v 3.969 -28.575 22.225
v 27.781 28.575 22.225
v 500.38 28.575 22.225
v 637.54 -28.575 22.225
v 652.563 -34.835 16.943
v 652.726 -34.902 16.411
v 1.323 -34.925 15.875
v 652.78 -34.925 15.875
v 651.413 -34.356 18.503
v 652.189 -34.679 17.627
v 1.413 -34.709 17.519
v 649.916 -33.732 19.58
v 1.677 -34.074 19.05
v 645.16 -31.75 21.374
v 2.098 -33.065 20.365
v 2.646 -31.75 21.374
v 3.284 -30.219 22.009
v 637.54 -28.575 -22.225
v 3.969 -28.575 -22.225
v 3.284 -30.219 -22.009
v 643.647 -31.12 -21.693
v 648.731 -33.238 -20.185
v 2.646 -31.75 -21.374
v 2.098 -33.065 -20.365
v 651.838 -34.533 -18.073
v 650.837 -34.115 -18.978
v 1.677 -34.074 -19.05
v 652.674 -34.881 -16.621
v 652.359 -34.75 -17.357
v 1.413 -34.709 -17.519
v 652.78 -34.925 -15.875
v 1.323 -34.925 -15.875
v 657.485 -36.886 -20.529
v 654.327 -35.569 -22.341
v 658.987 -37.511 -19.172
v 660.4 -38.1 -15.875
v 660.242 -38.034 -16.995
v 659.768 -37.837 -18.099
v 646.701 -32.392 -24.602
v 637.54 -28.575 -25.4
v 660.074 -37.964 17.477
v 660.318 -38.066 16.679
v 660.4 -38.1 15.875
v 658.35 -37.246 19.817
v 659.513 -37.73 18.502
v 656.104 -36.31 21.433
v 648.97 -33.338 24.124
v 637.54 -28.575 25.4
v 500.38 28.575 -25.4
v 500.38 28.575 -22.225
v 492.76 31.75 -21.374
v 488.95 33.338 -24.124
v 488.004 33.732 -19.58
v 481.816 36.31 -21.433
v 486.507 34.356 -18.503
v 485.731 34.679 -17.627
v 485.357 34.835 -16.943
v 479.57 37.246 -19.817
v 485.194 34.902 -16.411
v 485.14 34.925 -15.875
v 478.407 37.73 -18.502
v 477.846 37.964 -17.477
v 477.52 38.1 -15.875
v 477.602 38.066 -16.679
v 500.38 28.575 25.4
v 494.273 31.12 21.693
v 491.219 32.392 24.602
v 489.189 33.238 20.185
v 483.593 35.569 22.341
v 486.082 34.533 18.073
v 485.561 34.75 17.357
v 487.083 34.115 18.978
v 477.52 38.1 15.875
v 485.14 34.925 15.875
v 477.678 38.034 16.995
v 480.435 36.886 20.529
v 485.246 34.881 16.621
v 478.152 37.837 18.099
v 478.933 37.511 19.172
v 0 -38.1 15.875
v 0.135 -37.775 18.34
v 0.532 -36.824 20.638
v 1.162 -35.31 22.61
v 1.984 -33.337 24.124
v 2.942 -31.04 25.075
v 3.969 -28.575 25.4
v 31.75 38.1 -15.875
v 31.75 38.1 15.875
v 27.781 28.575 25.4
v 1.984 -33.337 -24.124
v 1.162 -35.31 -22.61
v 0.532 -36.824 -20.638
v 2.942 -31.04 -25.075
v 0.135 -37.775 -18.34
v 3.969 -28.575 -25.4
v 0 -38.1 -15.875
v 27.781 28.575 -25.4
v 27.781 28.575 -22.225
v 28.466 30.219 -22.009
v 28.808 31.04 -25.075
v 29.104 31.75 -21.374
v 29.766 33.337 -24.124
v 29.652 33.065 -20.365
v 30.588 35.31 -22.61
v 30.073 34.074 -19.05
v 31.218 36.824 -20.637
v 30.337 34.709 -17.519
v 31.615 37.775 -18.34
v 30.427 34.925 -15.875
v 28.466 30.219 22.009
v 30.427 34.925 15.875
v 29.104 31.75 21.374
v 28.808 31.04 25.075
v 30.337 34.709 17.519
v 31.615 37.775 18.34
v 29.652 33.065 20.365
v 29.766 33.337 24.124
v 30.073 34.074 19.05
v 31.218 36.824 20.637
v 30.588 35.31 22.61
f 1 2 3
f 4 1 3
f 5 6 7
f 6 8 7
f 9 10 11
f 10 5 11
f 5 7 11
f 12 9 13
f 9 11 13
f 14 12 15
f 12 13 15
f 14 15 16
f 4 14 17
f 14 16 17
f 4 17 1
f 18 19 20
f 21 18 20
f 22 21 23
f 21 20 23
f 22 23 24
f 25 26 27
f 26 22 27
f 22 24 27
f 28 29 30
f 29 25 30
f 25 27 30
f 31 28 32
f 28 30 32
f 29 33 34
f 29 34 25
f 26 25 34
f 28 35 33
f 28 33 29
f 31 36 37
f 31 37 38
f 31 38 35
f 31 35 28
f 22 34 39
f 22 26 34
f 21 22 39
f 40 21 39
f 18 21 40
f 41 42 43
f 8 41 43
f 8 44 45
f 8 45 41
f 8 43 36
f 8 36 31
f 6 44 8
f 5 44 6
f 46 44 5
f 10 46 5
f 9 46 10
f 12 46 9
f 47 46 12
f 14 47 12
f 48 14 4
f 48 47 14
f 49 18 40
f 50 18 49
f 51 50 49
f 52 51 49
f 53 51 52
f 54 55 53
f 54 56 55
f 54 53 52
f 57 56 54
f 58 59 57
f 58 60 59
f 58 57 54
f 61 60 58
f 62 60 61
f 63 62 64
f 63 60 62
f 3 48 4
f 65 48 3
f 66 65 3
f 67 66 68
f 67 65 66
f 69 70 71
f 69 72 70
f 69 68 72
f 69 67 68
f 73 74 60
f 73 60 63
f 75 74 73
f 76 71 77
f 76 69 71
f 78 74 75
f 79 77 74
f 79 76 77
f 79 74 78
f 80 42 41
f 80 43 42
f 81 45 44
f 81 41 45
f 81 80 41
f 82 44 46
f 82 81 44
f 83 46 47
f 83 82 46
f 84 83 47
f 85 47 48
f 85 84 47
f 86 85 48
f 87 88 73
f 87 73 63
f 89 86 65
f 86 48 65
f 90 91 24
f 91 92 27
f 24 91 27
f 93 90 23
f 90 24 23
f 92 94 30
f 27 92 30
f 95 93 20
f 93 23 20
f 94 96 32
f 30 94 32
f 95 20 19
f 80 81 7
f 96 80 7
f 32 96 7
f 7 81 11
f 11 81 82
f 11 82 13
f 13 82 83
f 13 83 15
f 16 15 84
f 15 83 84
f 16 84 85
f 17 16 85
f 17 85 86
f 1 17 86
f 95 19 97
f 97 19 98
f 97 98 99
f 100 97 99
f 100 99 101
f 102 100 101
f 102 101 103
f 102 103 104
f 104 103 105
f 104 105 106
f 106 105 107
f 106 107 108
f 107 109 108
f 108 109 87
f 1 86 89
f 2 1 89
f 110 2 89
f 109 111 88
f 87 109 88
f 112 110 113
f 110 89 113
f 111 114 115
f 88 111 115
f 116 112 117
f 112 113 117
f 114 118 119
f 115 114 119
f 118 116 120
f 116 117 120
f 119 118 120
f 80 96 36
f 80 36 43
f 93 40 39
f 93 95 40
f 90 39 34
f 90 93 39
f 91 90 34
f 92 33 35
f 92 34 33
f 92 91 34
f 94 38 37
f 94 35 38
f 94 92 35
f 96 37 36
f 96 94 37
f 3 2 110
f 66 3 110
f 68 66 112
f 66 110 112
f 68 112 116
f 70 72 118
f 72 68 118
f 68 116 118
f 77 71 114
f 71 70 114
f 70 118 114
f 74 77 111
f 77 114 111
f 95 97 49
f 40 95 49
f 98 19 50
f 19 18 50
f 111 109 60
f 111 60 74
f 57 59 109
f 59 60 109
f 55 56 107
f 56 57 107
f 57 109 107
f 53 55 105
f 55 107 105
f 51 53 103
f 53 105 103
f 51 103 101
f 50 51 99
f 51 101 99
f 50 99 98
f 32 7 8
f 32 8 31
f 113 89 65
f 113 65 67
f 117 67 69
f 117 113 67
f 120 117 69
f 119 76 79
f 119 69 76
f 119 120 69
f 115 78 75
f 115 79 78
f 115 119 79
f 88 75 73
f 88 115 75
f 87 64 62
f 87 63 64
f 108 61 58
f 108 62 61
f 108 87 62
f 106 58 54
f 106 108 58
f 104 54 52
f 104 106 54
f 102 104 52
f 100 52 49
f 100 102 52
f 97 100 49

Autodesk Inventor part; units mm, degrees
ref_plane "YZ Plane" through (0, 0, 0) normal (1, 0, 0) x (0, 1, 0)
ref_plane "XZ Plane" through (0, 0, 0) normal (0, 1, 0) x (-1, 0, 0)
ref_plane "XY Plane" through (0, 0, 0) normal (0, 0, 1) x (1, 0, 0)
sketch "Sketch1" plane through (0, 0, 0) normal (1, 0, 0) x (0, 1, 0)
  line L0 (-28.575, 25.4) -> (28.575, 25.4)
  line L1 (38.1, 15.875) -> (38.1, -15.875)
  line L2 (28.575, -25.4) -> (-28.575, -25.4)
  line L3 (-38.1, -15.875) -> (-38.1, 15.875)
  line L4 (-38.1, 25.4) -> (38.1, -25.4) construction
  line L5 (38.1, 25.4) -> (-38.1, -25.4) construction
  arc A0 (38.1, 15.875) -> (28.575, 25.4) centre (28.575, 15.875) ccw
  arc A1 (-28.575, 25.4) -> (-38.1, 15.875) centre (-28.575, 15.875) ccw
  arc A2 (-38.1, -15.875) -> (-28.575, -25.4) centre (-28.575, -15.875) ccw
  arc A3 (28.575, -25.4) -> (38.1, -15.875) centre (28.575, -15.875) ccw
  line L6 (34.925, -15.875) -> (34.925, 15.875)
  arc A4 (34.925, 15.875) -> (28.575, 22.225) centre (28.575, 15.875) ccw
  line L7 (28.575, 22.225) -> (-28.575, 22.225)
  arc A5 (-28.575, 22.225) -> (-34.925, 15.875) centre (-28.575, 15.875) ccw
  line L8 (-34.925, 15.875) -> (-34.925, -15.875)
  arc A6 (-34.925, -15.875) -> (-28.575, -22.225) centre (-28.575, -15.875) ccw
  line L9 (-28.575, -22.225) -> (28.575, -22.225)
  arc A7 (28.575, -22.225) -> (34.925, -15.875) centre (28.575, -15.875) ccw
  point P0 (0, 0)
  dimension "d0" = 76.2
  dimension "d1" = 50.8
  dimension "d2" = 9.525
  dimension "d3" = 3.175
extrude "Extrusion1" add sketch "Sketch1" along normal blind 660.4
sketch "Sketch2" plane through (0, -28.575, 25.4) normal (0, 0, 1) x (1, 0, 0)
  line L0 (0, -9.525) -> (660.4, -9.525) projected
  line L1 (0, -9.525) -> (31.75, 66.675)
  line L2 (0, 66.675) -> (660.4, 66.675) projected
  line L3 (0, 57.15) -> (0, 0) projected
  line L4 (0, 57.15) -> (0, 66.675) projected
  line L5 (54.4286, 66.675) -> (0, 66.675)
  line L6 (0, 66.675) -> (0, -9.525)
  line L7 (660.4, -9.525) -> (477.52, 66.675)
  line L8 (477.52, 66.675) -> (660.4, 66.675)
  line L9 (660.4, 66.675) -> (660.4, -9.525)
  line L10 (0, 57.15) -> (660.4, 57.15) projected
  point P0 (0, 28.575)
  dimension "d6" = 22.62
  dimension "d7" = 22.62
extrude "Extrusion2" cut sketch "Sketch2" against normal through all contours L6 L3 L10 L1 | L7 L10 L9 | L10 L4 L2 L1 | L7 L2 L9 L10
equation "\"d0\" = stockWidth"
equation "\"d1\" = stockHeight"
equation "\"d2\" = stockRad"
equation "\"d3\" = stockGuage"
equation "\"d4\" = sup1Len"
equation "\"d6\" = sup1Ang"
equation "\"d7\" = sup1Ang"
equation "\"height\" = 203.2"
equation "\"shaftDiam\" = 6.35"
equation "\"shaftSpace\" = 1.5875"
equation "\"stageSpace\" = 2.54"
equation "\"stageAngle\" = 15deg"
equation "\"stockHeight\" = 50.8"
equation "\"stockWidth\" = 76.2"
equation "\"stockRad\" = 9.525"
equation "\"stockGuage\" = 3.175"
equation "\"groundActu\" = 304.8"
equation "\"baseWidth\" = 1066.8"
equation "\"baseDepth\" = 254"
equation "\"capThickness\" = 3.175"
equation "\"sup1Len\" = 660.4"
equation "\"sup1Ang\" = 22.6199deg"
equation "\"supVertLen\" = 955.13561"
equation "\"sup2Ang\" = 8.959949deg"
equation "\"sup2Len\" = 2079.37366"
equation "\"supSideAng\" = 19.376933deg"
equation "\"supSideLen\" = 1531.12879"
equation "\"FlangeDiam\" = 12.7"
equation "\"bearingDiam\" = 9.5504"
equation "\"FlangeDepth\" = 1.5875"
equation "\"smallFilet\" = 0.39687"
equation "\"thickness\" = 12.7"
equation "\"ringDiam\" = 96.46608"
properties part number "support 1" material "Aluminum 6061"
